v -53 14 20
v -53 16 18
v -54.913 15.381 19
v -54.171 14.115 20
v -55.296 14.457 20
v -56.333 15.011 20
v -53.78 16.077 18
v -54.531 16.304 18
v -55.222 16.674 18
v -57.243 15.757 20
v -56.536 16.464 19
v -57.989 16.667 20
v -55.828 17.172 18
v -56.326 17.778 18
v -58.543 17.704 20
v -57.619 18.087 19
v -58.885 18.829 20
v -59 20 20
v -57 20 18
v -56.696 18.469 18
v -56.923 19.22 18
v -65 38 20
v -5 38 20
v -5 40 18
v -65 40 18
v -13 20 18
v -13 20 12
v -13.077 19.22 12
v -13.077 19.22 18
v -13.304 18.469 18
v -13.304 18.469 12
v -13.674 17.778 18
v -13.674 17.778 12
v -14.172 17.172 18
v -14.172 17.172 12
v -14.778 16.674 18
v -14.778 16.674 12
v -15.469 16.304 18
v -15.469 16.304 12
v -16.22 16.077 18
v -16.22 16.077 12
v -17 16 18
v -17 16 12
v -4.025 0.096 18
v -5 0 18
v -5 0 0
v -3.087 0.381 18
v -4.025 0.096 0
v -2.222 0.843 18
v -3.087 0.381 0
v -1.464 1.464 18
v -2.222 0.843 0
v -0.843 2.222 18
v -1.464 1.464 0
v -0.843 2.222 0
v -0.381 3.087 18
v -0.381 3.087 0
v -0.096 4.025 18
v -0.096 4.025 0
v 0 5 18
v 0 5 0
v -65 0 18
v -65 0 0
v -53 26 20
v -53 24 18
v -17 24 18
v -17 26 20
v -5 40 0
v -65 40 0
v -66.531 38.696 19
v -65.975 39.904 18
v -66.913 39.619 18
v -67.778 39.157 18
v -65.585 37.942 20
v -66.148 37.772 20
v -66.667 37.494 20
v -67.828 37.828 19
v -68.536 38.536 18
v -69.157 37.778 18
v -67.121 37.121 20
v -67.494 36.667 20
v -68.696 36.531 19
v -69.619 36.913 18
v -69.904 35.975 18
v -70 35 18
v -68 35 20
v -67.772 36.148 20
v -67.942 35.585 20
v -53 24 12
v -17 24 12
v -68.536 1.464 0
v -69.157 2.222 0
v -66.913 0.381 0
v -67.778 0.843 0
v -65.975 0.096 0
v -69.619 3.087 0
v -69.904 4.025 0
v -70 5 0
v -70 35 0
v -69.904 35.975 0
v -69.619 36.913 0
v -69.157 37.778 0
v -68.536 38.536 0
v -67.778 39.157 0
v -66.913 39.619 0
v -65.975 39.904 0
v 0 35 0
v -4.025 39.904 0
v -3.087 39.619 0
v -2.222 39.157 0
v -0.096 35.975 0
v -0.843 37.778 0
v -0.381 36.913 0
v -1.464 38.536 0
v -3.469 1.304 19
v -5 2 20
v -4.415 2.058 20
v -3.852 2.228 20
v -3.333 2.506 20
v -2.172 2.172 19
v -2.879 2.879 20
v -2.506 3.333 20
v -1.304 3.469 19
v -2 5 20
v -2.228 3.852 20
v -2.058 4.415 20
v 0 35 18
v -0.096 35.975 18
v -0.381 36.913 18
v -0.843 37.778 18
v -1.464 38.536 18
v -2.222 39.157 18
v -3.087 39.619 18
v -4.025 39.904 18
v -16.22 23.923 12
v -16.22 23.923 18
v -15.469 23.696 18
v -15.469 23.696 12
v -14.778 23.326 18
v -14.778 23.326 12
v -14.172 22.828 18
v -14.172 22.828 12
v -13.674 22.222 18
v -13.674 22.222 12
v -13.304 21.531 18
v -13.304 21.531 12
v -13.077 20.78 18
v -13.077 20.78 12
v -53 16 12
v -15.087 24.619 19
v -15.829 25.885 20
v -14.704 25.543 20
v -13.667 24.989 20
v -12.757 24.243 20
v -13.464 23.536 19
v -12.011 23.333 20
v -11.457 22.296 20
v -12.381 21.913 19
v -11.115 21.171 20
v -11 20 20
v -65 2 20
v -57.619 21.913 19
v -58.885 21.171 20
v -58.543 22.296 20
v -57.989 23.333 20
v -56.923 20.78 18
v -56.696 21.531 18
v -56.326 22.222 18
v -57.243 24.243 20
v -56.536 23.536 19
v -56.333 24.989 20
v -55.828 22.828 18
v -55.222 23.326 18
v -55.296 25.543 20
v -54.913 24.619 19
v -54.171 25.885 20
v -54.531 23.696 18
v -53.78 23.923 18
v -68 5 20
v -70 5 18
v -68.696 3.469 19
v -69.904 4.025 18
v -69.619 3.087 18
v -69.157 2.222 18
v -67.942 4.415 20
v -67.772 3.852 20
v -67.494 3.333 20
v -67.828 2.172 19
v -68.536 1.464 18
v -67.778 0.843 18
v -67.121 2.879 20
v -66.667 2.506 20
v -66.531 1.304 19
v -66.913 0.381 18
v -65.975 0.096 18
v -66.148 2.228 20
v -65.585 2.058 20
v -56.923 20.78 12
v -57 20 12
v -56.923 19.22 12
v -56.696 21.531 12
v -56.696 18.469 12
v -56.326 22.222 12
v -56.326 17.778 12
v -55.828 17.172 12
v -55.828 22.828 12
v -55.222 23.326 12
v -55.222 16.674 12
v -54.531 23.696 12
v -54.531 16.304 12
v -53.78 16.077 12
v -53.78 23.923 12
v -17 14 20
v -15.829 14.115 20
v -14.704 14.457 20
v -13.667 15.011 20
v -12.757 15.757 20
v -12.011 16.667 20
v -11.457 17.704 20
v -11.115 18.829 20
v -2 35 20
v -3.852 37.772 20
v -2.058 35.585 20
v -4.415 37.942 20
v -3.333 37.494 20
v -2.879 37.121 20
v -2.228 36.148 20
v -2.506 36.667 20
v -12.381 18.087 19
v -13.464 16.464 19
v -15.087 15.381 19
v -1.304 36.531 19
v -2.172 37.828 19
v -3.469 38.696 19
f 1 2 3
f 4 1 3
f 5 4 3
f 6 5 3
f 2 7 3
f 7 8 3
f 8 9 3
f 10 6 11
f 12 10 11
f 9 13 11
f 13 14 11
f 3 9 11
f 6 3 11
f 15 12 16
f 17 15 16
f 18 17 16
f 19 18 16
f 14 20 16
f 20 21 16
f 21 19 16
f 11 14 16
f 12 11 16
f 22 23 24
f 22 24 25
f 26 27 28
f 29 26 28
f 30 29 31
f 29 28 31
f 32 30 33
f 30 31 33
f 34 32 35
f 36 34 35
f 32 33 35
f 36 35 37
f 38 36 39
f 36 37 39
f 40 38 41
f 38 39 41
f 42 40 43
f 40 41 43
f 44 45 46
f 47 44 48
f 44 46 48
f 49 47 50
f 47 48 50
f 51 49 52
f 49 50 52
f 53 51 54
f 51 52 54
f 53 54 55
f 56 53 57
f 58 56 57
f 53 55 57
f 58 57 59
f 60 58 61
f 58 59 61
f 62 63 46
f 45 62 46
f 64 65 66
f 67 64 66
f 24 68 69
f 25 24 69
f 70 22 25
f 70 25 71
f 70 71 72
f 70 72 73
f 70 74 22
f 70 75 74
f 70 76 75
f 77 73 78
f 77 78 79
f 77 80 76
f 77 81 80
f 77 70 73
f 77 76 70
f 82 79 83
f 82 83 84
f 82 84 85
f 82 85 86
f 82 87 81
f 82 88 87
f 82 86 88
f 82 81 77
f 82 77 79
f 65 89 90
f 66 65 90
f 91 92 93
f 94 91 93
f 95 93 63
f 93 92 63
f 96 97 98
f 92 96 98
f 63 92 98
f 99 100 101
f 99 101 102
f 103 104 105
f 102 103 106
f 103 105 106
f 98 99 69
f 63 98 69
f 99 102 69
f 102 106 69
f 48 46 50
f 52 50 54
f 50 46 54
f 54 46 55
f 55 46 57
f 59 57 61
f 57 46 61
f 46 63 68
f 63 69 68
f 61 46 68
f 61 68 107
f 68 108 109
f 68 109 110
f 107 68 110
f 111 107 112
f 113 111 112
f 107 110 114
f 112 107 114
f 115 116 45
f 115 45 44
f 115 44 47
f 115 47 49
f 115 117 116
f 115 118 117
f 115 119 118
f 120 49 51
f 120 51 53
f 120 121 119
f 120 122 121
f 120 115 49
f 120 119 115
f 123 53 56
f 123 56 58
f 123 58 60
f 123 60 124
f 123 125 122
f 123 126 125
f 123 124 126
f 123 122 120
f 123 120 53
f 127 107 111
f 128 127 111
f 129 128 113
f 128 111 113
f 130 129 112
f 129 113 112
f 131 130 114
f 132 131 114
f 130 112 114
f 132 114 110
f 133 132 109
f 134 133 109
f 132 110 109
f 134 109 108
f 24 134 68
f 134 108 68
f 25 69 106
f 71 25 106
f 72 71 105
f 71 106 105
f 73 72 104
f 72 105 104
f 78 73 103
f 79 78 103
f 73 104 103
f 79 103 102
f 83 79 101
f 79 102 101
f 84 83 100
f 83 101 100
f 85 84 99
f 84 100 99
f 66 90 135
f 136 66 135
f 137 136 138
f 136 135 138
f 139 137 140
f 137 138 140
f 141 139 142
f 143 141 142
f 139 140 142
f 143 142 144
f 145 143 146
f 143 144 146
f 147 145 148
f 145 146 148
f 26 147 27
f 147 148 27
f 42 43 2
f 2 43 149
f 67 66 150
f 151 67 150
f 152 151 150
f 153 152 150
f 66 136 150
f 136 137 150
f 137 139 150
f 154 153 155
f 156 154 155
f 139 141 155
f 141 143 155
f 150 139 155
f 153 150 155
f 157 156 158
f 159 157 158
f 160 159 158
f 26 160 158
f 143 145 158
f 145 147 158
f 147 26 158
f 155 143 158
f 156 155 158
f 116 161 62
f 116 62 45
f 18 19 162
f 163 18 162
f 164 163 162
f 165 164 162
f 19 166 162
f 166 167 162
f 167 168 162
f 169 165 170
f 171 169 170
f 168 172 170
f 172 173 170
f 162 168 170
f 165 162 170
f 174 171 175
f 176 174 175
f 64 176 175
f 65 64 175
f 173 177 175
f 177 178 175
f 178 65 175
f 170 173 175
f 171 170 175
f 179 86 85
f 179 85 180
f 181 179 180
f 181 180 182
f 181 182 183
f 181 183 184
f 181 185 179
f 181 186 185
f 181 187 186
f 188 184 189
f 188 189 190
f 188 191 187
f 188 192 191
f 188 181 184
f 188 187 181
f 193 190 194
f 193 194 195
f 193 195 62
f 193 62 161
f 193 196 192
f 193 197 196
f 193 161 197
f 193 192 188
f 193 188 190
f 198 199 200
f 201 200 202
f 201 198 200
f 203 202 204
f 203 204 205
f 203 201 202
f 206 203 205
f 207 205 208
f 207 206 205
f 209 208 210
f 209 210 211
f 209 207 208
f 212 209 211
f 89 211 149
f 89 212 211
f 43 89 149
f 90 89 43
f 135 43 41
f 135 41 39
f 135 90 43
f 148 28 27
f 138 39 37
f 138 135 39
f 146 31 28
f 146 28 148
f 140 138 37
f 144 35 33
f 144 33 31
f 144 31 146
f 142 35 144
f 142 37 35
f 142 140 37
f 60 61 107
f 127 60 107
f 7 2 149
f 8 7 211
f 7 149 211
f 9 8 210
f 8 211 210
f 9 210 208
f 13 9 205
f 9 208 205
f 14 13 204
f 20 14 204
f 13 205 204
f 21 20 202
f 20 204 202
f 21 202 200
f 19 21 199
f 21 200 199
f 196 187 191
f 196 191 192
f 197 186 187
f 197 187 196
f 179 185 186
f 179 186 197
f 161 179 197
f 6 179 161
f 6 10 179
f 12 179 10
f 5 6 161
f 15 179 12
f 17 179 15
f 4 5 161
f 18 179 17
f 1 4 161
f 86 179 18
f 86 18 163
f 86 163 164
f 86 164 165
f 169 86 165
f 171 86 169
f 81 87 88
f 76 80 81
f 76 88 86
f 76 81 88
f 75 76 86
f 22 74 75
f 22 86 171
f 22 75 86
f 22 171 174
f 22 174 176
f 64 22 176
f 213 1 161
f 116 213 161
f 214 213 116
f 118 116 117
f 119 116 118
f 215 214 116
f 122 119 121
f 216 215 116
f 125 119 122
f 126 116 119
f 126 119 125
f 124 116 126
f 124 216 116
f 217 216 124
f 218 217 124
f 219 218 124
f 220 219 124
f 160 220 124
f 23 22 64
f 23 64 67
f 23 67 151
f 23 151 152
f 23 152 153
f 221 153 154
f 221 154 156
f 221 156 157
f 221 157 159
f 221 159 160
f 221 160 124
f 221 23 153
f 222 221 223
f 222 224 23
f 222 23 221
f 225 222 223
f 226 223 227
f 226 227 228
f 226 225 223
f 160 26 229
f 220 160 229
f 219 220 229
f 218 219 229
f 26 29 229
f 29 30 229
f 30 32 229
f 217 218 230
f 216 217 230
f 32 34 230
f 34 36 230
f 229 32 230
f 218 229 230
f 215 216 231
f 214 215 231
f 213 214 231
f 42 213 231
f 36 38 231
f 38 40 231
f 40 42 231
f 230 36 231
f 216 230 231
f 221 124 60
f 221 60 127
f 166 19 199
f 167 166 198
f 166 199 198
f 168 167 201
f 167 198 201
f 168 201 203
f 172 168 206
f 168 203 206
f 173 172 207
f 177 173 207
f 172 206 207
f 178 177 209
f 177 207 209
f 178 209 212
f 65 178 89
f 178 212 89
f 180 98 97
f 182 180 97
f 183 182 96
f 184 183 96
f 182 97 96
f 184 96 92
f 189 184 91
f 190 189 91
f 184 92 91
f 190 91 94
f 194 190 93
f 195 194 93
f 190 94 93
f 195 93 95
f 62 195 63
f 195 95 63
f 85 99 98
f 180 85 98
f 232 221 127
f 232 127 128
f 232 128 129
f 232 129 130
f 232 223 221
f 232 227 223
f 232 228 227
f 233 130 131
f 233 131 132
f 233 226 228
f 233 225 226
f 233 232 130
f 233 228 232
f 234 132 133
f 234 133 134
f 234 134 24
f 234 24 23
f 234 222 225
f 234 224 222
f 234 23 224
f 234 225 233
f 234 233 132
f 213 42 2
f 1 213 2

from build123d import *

# Parameters (mm, degrees)
F1_DEPTH = 20
F2_DEPTH = 12
F3_SIZE  = 2


with BuildPart() as f1:
    # F0 (on Top) → F1 (new body)
    with BuildSketch(Plane.XY):
        with BuildLine():
            Line((-65, 0), (-5, 0))
            ThreePointArc((-5, 0), (-1.464466, 1.464466), (0, 5))
            Line((0, 5), (0, 35))
            ThreePointArc((0, 35), (-1.464466, 38.535534), (-5, 40))
            Line((-5, 40), (-65, 40))
            ThreePointArc((-65, 40), (-68.535534, 38.535534), (-70, 35))
            Line((-70, 35), (-70, 5))
            ThreePointArc((-70, 5), (-68.535534, 1.464466), (-65, 0))
        make_face()
        with BuildLine():
            ThreePointArc((-57, 20), (-55.828427, 22.828427), (-53, 24))
            Line((-53, 24), (-17, 24))
            ThreePointArc((-17, 24), (-14.171573, 22.828427), (-13, 20))
            ThreePointArc((-13, 20), (-14.171573, 17.171573), (-17, 16))
            Line((-17, 16), (-53, 16))
            ThreePointArc((-53, 16), (-55.828427, 17.171573), (-57, 20))
        make_face(mode=Mode.SUBTRACT)
    extrude(amount=F1_DEPTH)

    # F0 (on Top) → F2 (join)
    with BuildSketch(Plane.XY):
        with BuildLine():
            Line((-17, 24), (-53, 24))
            ThreePointArc((-53, 24), (-55.828427, 22.828427), (-57, 20))
            ThreePointArc((-57, 20), (-55.828427, 17.171573), (-53, 16))
            Line((-53, 16), (-17, 16))
            ThreePointArc((-17, 16), (-14.171573, 17.171573), (-13, 20))
            ThreePointArc((-13, 20), (-14.171573, 22.828427), (-17, 24))
        make_face()
    extrude(amount=F2_DEPTH)

    # F3
    f3_edges = [f1.edges().sort_by_distance(p)[0] for p in [
        (-35, 24, 20),
        (-35, 0, 20),
    ]]
    chamfer(f3_edges, length=F3_SIZE)


solid = f1.part
